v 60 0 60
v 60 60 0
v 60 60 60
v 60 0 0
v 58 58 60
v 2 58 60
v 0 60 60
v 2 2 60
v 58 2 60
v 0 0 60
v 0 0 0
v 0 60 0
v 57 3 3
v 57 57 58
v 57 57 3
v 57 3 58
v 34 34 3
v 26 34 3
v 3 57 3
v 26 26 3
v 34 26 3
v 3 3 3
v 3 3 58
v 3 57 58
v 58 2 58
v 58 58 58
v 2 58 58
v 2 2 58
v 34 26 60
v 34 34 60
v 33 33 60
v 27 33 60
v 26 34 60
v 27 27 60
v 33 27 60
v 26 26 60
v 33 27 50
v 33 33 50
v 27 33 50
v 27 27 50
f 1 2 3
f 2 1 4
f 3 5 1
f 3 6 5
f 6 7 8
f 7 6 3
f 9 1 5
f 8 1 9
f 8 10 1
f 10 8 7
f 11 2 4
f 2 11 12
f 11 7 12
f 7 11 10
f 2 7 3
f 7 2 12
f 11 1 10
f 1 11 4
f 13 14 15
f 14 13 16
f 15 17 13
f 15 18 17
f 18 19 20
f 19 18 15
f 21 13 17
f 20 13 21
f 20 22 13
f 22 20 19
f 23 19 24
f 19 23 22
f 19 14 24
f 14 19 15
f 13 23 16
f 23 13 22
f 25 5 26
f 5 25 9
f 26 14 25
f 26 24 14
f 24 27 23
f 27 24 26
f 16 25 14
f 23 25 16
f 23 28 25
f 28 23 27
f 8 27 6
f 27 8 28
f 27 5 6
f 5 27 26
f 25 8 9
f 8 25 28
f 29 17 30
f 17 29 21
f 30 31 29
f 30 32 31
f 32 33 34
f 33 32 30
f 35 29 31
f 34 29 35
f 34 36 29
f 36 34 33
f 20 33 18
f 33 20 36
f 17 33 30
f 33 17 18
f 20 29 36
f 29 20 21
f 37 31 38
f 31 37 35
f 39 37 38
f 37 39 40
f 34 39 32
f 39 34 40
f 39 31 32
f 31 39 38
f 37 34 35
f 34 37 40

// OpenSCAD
difference()
{
  cube(60);
  translate([3,3,3]) cube([54,54,60]);
  translate([2,2,58]) cube([56,56,3]);
}
difference()
{
  translate([26,26,0]) cube([8,8,60]);
  translate([27,27,50]) cube([6,6,16]);
}
